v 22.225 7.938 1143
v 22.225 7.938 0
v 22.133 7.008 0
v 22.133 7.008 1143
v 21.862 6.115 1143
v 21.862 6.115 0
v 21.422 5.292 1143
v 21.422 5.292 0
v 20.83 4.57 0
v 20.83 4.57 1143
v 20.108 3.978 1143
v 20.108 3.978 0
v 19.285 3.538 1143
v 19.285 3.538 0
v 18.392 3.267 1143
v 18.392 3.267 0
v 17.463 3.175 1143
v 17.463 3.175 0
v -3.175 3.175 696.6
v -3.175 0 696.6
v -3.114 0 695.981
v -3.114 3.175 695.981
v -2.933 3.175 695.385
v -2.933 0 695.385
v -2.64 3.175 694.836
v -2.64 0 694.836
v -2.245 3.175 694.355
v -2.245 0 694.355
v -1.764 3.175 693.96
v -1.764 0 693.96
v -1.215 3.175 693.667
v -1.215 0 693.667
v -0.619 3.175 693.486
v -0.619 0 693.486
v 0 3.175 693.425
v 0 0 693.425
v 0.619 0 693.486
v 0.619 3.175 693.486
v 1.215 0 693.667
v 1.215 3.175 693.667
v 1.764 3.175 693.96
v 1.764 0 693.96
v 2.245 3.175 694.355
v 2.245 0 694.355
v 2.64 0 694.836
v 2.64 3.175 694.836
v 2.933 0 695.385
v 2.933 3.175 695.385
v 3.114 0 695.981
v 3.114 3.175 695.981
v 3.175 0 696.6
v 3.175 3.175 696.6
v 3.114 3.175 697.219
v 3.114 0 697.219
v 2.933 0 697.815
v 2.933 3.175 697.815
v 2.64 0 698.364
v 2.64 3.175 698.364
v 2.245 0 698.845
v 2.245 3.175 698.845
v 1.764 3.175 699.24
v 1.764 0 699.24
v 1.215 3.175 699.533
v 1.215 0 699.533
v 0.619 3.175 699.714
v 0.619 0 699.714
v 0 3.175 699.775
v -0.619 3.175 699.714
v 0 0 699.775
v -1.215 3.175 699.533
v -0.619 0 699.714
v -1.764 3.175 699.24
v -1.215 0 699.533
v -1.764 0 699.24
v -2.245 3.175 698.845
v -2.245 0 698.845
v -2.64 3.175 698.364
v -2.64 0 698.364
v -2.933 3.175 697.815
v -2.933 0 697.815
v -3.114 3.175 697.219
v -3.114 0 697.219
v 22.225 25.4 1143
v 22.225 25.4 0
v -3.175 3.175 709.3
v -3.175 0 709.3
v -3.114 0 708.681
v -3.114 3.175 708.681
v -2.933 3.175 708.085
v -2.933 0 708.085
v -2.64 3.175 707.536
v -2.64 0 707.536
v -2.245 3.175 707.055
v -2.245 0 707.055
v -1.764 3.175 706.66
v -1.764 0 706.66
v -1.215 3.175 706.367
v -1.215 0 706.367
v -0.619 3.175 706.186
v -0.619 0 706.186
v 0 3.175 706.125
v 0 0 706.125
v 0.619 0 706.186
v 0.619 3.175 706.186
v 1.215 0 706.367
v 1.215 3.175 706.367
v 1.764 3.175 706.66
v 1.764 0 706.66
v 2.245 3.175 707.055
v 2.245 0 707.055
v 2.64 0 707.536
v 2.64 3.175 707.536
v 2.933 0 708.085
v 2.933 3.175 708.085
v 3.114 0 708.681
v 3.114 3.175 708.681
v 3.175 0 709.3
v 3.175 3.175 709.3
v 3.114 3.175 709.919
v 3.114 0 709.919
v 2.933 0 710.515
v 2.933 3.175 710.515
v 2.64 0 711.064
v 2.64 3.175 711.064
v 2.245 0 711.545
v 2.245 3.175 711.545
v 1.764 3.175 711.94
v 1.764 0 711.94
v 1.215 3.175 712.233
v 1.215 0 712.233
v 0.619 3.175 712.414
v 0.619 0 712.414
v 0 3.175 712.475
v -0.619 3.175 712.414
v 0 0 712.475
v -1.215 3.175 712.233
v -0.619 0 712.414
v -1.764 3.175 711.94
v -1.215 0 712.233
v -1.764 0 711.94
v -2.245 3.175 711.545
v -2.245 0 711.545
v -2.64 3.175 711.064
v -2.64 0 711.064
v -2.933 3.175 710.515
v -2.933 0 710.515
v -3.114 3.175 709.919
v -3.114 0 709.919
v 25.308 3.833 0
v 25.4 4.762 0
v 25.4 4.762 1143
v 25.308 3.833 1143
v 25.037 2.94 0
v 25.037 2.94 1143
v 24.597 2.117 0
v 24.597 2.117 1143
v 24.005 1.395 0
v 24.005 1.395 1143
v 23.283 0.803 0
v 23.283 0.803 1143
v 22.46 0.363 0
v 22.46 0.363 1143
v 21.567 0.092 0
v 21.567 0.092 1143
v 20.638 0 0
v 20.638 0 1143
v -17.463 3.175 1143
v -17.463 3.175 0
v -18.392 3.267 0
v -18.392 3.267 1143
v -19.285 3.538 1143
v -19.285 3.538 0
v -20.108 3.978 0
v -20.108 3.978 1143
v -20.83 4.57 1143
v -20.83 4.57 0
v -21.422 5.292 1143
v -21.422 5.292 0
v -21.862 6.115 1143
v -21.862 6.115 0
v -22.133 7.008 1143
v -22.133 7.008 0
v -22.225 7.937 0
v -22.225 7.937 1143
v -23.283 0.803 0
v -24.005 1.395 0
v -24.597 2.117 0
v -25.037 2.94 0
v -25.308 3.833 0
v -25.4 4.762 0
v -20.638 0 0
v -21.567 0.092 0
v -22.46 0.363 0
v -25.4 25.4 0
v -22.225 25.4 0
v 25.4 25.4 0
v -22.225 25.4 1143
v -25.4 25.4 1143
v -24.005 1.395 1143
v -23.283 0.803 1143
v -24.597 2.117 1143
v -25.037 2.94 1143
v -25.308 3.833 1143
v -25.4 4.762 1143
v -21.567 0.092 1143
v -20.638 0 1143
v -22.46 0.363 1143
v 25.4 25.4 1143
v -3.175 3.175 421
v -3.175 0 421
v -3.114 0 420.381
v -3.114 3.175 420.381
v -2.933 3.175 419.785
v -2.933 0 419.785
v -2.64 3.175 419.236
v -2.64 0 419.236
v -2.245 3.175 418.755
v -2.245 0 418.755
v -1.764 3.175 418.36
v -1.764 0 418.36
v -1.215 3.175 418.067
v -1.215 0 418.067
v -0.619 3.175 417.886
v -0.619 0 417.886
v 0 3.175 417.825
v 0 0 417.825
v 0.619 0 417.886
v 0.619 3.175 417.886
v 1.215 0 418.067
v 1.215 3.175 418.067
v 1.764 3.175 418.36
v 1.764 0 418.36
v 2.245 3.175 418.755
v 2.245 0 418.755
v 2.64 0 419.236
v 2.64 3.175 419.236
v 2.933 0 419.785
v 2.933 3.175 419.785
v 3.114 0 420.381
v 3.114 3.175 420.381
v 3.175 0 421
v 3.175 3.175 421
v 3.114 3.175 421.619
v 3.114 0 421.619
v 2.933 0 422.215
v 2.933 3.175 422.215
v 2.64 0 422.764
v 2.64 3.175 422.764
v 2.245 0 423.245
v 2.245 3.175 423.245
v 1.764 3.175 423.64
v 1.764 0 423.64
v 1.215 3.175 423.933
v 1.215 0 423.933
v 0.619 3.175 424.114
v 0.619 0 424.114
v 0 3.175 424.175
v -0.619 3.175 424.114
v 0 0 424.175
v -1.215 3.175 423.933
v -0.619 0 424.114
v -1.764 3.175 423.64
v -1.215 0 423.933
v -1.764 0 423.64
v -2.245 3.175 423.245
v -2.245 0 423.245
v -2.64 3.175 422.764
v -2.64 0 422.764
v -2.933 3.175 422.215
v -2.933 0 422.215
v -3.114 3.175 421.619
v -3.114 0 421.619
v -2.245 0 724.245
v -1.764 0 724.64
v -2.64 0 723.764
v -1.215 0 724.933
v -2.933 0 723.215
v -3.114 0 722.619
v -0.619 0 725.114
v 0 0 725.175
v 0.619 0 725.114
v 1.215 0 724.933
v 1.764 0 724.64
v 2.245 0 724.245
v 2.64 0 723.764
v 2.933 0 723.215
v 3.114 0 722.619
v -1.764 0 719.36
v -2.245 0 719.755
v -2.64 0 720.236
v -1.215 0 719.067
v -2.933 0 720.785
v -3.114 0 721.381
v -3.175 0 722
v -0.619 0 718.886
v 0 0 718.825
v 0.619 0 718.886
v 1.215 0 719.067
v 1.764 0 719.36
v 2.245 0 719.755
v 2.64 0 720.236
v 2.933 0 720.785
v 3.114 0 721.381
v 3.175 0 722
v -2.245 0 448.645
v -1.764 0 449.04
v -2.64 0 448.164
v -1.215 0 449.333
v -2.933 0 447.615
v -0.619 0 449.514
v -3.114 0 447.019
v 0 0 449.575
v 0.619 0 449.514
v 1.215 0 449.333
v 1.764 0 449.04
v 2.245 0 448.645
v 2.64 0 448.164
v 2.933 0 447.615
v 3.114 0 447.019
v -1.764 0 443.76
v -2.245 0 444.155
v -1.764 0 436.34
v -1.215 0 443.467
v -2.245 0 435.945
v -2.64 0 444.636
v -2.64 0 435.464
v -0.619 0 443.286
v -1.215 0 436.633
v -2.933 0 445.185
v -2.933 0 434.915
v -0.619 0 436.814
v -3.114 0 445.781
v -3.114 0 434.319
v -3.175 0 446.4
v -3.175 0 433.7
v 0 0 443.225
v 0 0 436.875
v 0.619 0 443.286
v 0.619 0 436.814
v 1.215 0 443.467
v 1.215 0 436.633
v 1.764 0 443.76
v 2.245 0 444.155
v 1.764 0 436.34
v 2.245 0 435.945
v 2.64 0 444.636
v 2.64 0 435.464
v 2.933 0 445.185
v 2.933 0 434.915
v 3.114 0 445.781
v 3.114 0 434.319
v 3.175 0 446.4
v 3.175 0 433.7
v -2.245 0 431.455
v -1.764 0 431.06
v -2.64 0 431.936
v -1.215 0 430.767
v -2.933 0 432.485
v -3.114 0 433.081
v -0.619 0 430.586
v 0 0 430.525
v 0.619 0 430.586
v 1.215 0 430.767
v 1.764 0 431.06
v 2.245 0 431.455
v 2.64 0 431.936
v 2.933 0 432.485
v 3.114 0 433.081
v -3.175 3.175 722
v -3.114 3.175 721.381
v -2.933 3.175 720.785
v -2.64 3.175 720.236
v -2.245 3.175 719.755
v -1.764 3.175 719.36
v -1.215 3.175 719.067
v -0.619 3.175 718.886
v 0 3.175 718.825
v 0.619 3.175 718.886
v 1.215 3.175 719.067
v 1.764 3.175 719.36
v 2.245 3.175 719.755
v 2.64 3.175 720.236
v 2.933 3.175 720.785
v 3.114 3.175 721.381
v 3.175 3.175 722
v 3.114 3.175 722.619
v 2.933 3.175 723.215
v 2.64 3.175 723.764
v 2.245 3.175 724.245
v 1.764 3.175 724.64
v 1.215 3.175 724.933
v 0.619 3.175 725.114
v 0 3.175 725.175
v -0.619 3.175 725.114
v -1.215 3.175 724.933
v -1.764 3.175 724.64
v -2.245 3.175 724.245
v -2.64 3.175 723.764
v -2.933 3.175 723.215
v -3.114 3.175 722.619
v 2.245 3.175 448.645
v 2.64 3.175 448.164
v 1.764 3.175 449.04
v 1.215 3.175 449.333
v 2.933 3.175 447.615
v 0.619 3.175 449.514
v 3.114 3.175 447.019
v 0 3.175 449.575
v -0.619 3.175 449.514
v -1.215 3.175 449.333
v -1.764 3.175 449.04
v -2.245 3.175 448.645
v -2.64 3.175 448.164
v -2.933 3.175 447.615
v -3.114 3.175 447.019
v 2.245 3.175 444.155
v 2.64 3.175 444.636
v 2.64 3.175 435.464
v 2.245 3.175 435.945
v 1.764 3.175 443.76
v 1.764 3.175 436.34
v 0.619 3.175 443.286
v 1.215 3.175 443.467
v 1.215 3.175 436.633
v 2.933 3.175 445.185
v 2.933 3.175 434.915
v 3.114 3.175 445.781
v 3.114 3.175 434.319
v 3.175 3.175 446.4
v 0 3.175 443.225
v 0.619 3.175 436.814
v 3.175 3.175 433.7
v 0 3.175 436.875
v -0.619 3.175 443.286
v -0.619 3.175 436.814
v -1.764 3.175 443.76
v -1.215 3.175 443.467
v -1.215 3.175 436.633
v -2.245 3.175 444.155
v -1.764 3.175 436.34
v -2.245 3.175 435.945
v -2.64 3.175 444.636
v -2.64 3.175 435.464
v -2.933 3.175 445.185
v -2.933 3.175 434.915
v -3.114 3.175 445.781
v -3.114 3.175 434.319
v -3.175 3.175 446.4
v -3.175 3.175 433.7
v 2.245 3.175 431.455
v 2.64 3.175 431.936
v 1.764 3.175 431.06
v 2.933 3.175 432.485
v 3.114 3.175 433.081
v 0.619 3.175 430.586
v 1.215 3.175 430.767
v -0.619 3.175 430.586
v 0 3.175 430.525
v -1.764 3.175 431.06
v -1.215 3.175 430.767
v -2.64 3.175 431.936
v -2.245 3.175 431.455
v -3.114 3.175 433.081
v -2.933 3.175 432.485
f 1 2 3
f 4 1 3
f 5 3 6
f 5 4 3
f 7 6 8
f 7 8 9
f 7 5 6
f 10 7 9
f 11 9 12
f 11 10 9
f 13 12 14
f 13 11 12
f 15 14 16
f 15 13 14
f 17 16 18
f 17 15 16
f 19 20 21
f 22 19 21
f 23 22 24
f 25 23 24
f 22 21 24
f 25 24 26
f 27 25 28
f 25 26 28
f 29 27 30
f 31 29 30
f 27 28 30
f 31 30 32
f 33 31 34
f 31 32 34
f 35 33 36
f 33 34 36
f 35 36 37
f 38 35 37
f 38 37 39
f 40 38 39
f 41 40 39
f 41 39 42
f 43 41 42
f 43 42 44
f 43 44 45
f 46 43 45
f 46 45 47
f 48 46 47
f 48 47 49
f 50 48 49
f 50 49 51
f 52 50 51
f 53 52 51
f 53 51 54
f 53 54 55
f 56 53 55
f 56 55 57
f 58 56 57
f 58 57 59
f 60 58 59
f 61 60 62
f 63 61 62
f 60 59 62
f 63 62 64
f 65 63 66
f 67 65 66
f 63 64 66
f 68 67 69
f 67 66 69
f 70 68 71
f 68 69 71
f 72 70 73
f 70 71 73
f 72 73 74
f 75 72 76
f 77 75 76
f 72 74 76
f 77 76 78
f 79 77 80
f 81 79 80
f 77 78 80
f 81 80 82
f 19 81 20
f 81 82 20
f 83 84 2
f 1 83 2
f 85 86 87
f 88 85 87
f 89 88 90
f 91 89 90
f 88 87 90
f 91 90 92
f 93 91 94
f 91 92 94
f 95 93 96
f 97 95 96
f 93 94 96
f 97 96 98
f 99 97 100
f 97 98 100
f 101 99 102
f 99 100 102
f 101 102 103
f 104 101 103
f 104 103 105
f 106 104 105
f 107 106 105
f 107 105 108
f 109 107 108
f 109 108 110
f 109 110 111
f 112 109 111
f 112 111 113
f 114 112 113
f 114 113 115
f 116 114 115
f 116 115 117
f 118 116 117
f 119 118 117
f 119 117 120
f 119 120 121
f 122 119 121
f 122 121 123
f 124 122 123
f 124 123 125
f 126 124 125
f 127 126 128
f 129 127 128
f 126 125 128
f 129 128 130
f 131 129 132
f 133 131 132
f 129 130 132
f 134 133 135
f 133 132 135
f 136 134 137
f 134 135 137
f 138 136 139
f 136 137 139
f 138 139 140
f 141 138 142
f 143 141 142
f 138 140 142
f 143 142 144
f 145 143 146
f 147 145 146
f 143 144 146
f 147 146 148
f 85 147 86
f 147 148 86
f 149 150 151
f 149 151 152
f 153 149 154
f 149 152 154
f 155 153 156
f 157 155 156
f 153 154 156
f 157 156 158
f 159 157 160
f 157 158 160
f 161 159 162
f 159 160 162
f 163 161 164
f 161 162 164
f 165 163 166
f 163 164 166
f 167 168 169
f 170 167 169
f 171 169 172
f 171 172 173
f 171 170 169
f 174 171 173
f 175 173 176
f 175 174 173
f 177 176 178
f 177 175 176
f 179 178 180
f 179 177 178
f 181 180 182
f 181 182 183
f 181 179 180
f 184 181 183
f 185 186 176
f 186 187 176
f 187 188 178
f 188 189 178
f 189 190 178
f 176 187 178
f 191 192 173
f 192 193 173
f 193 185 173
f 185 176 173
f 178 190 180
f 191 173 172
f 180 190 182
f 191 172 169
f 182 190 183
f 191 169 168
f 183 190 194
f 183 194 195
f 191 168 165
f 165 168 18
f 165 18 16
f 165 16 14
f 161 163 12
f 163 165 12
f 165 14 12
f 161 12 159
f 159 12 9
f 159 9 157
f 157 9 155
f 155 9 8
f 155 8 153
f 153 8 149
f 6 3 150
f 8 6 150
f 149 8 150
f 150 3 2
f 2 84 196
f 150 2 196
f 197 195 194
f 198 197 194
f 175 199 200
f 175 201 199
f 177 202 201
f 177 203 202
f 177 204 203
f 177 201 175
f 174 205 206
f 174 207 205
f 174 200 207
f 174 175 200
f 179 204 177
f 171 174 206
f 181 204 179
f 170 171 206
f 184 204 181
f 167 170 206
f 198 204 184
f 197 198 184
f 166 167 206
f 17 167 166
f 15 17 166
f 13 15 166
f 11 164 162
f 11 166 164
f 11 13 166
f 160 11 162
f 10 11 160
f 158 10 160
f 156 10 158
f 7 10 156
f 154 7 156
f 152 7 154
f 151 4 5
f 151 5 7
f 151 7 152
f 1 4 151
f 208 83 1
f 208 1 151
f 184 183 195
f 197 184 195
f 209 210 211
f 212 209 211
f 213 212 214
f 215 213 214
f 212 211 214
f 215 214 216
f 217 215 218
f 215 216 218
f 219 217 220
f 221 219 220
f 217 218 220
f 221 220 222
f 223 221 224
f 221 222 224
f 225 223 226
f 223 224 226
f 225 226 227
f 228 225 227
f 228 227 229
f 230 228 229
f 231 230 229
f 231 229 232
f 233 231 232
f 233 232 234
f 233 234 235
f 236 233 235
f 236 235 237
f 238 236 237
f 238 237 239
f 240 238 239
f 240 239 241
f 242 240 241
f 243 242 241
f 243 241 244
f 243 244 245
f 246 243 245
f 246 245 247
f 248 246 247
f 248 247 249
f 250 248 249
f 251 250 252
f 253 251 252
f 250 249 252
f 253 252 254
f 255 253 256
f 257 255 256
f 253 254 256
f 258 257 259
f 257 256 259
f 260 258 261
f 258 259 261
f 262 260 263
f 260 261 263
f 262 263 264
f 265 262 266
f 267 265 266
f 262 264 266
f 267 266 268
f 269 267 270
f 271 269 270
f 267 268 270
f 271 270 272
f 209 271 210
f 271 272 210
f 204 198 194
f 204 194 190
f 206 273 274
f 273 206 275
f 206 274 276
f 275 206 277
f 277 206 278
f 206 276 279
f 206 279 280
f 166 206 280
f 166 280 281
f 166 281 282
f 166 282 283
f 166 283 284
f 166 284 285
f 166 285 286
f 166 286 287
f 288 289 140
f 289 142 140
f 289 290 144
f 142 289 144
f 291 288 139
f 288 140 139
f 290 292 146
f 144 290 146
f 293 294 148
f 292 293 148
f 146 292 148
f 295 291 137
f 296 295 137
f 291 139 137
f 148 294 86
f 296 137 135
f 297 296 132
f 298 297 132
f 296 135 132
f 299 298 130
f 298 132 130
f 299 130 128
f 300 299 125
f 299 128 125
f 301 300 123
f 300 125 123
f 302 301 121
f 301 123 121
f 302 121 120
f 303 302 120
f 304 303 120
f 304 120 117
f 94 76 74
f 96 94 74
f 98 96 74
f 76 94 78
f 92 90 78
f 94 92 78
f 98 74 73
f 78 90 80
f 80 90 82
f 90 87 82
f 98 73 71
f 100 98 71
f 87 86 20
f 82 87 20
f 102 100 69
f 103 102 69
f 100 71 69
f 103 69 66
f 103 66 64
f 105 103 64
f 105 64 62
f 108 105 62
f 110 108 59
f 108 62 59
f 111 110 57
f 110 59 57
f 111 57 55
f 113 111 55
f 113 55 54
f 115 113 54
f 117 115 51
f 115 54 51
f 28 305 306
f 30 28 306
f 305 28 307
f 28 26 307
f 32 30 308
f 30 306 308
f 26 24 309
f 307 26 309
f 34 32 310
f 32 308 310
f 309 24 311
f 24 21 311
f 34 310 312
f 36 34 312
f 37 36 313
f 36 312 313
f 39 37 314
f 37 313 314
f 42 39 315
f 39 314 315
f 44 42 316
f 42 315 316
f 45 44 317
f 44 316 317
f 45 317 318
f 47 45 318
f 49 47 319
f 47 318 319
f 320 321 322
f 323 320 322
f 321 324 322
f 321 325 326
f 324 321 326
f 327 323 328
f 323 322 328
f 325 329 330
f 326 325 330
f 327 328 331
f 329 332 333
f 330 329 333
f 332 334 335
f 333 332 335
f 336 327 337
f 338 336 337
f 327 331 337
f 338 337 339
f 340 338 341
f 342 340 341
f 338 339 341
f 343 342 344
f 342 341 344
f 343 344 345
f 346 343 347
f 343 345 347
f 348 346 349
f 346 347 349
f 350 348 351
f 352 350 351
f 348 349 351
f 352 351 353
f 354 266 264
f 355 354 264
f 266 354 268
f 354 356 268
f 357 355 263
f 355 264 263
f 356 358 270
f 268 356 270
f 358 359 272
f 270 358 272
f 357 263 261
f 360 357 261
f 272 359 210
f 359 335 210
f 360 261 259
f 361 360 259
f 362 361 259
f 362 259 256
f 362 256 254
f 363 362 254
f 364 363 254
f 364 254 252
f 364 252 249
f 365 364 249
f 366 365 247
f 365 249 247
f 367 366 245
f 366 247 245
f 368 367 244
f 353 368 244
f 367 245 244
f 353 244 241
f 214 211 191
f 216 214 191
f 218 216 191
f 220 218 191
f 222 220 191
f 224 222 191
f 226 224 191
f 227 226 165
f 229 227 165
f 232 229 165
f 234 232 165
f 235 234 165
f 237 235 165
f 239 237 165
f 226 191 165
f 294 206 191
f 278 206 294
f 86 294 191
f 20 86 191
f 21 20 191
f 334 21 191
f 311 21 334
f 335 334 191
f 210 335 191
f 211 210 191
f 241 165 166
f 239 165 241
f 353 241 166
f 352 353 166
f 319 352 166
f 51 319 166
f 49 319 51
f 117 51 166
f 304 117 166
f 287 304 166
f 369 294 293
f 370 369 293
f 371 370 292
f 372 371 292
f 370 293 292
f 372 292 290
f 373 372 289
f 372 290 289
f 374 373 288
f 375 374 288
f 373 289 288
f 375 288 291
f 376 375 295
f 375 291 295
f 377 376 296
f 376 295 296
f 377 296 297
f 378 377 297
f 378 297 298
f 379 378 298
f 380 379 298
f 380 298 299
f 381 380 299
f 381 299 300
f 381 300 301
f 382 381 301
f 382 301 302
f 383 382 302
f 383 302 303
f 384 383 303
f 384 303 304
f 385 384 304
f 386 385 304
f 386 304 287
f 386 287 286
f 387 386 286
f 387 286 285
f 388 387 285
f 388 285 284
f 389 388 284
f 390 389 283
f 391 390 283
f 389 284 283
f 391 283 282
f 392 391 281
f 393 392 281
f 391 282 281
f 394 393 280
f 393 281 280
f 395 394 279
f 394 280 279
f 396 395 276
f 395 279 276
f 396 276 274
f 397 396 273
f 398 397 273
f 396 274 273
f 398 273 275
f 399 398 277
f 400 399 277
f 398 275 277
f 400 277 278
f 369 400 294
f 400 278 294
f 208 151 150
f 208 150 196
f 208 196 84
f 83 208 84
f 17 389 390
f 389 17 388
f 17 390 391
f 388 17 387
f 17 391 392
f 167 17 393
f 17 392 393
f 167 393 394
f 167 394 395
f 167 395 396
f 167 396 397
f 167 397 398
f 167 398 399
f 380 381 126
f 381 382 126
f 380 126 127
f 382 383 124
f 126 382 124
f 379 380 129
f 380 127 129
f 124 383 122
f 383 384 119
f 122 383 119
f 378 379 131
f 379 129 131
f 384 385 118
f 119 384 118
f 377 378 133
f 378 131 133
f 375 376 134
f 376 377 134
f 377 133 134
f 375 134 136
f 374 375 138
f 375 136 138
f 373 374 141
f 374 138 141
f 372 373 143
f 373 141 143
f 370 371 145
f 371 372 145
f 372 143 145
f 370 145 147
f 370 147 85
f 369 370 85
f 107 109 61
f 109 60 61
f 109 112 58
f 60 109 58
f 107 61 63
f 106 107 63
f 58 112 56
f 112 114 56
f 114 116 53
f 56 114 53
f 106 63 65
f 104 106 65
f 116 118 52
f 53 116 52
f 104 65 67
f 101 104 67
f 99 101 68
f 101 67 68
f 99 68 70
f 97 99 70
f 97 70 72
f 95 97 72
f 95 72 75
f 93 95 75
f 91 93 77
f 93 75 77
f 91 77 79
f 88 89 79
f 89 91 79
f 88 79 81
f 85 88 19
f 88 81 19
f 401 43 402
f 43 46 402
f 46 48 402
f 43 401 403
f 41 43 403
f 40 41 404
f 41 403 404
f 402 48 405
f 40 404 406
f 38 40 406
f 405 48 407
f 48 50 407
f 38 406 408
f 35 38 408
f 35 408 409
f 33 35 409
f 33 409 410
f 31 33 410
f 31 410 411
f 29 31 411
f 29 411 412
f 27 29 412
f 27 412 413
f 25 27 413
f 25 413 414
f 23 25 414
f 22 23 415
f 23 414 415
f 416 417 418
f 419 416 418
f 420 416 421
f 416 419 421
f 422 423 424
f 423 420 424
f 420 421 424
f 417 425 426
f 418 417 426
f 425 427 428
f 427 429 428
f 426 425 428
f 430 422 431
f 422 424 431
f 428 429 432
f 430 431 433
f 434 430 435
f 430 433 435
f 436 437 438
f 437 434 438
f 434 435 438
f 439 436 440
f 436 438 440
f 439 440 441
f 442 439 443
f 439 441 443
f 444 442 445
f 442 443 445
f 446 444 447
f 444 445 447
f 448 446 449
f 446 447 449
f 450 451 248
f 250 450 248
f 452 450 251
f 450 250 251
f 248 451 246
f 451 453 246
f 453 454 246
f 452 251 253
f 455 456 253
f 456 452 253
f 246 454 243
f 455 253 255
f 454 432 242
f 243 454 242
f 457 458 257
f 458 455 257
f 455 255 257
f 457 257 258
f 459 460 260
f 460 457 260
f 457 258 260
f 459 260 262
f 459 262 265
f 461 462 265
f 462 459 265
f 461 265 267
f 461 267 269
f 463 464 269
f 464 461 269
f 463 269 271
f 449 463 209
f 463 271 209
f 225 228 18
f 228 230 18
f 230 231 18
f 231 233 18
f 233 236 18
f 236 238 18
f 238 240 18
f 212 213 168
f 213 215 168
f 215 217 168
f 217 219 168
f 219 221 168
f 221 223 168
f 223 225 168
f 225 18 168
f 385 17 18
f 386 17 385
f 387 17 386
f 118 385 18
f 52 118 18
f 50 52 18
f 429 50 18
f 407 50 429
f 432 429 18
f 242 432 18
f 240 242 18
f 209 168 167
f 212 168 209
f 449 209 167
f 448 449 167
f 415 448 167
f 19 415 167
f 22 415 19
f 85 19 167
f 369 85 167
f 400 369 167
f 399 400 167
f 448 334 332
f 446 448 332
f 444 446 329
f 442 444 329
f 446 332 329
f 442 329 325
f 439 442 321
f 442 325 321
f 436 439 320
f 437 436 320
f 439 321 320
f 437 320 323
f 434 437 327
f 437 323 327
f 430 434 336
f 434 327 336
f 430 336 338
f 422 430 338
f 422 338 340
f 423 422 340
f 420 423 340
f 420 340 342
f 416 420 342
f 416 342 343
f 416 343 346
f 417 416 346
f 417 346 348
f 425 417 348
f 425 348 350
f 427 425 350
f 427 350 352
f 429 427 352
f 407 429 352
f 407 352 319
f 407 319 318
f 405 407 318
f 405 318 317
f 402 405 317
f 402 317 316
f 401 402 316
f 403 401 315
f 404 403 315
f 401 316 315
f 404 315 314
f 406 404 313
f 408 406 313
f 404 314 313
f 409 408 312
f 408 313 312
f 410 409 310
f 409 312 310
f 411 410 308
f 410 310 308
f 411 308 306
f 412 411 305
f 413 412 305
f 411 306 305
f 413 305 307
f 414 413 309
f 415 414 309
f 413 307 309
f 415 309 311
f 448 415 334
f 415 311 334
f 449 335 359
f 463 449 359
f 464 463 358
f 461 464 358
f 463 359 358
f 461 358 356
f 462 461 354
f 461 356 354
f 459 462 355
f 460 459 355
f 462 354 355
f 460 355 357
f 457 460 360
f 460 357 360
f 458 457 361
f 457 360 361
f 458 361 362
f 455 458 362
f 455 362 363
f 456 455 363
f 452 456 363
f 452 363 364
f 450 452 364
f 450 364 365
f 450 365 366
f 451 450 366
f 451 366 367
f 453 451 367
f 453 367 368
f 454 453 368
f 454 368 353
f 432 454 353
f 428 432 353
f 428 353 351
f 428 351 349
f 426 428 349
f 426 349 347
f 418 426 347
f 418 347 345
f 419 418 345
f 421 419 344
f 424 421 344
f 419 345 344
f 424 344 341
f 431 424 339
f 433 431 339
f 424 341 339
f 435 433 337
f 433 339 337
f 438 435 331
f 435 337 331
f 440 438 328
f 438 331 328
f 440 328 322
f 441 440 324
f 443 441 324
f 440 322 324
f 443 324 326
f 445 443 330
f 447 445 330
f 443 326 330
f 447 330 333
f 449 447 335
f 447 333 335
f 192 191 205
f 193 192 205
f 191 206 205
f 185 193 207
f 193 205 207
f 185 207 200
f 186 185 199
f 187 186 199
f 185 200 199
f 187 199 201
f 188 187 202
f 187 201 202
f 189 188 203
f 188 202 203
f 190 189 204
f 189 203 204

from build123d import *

# Parameters (mm, degrees)
BOSS_EXTRUDE1_DEPTH         = 1143
FILLET1_R                   = 4.7625
FILLET2_R                   = 4.7625
F_1_4_0_25_DIAMETER_HOLE1_D = 6.35


with BuildPart() as part:
    # Sketch1 → Boss-Extrude1 (new body)
    with BuildSketch(Plane.XY):
        Polygon((-25.4, 25.4), (-25.4, 0), (25.4, 0), (25.4, 25.4), (22.225, 25.4), (22.225, 3.175), (-22.225, 3.175), (-22.225, 25.4), align=None)
    extrude(amount=BOSS_EXTRUDE1_DEPTH)

    # Fillet1
    fillet1_edges = [part.edges().sort_by_distance(p)[0] for p in [
        (-22.225, 3.175, 571.5),
        (22.225, 3.175, 571.5),
    ]]
    fillet(fillet1_edges, radius=FILLET1_R)

    # Fillet2
    fillet2_edges = [part.edges().sort_by_distance(p)[0] for p in [
        (25.4, 0, 571.5),
        (-25.4, 0, 571.5),
    ]]
    fillet(fillet2_edges, radius=FILLET2_R)

    # 1/4 (0.25) Diameter Hole1 (through all)
    with Locations(Plane(origin=(0, 3.175, 0), x_dir=(1, 0, 0), z_dir=(0, 1, 0))):
        with Locations((0, -722), (0, -709.3), (0, -696.6), (0, -446.4), (0, -433.7), (0, -421)):
            Hole(F_1_4_0_25_DIAMETER_HOLE1_D / 2)


solid = part.part
